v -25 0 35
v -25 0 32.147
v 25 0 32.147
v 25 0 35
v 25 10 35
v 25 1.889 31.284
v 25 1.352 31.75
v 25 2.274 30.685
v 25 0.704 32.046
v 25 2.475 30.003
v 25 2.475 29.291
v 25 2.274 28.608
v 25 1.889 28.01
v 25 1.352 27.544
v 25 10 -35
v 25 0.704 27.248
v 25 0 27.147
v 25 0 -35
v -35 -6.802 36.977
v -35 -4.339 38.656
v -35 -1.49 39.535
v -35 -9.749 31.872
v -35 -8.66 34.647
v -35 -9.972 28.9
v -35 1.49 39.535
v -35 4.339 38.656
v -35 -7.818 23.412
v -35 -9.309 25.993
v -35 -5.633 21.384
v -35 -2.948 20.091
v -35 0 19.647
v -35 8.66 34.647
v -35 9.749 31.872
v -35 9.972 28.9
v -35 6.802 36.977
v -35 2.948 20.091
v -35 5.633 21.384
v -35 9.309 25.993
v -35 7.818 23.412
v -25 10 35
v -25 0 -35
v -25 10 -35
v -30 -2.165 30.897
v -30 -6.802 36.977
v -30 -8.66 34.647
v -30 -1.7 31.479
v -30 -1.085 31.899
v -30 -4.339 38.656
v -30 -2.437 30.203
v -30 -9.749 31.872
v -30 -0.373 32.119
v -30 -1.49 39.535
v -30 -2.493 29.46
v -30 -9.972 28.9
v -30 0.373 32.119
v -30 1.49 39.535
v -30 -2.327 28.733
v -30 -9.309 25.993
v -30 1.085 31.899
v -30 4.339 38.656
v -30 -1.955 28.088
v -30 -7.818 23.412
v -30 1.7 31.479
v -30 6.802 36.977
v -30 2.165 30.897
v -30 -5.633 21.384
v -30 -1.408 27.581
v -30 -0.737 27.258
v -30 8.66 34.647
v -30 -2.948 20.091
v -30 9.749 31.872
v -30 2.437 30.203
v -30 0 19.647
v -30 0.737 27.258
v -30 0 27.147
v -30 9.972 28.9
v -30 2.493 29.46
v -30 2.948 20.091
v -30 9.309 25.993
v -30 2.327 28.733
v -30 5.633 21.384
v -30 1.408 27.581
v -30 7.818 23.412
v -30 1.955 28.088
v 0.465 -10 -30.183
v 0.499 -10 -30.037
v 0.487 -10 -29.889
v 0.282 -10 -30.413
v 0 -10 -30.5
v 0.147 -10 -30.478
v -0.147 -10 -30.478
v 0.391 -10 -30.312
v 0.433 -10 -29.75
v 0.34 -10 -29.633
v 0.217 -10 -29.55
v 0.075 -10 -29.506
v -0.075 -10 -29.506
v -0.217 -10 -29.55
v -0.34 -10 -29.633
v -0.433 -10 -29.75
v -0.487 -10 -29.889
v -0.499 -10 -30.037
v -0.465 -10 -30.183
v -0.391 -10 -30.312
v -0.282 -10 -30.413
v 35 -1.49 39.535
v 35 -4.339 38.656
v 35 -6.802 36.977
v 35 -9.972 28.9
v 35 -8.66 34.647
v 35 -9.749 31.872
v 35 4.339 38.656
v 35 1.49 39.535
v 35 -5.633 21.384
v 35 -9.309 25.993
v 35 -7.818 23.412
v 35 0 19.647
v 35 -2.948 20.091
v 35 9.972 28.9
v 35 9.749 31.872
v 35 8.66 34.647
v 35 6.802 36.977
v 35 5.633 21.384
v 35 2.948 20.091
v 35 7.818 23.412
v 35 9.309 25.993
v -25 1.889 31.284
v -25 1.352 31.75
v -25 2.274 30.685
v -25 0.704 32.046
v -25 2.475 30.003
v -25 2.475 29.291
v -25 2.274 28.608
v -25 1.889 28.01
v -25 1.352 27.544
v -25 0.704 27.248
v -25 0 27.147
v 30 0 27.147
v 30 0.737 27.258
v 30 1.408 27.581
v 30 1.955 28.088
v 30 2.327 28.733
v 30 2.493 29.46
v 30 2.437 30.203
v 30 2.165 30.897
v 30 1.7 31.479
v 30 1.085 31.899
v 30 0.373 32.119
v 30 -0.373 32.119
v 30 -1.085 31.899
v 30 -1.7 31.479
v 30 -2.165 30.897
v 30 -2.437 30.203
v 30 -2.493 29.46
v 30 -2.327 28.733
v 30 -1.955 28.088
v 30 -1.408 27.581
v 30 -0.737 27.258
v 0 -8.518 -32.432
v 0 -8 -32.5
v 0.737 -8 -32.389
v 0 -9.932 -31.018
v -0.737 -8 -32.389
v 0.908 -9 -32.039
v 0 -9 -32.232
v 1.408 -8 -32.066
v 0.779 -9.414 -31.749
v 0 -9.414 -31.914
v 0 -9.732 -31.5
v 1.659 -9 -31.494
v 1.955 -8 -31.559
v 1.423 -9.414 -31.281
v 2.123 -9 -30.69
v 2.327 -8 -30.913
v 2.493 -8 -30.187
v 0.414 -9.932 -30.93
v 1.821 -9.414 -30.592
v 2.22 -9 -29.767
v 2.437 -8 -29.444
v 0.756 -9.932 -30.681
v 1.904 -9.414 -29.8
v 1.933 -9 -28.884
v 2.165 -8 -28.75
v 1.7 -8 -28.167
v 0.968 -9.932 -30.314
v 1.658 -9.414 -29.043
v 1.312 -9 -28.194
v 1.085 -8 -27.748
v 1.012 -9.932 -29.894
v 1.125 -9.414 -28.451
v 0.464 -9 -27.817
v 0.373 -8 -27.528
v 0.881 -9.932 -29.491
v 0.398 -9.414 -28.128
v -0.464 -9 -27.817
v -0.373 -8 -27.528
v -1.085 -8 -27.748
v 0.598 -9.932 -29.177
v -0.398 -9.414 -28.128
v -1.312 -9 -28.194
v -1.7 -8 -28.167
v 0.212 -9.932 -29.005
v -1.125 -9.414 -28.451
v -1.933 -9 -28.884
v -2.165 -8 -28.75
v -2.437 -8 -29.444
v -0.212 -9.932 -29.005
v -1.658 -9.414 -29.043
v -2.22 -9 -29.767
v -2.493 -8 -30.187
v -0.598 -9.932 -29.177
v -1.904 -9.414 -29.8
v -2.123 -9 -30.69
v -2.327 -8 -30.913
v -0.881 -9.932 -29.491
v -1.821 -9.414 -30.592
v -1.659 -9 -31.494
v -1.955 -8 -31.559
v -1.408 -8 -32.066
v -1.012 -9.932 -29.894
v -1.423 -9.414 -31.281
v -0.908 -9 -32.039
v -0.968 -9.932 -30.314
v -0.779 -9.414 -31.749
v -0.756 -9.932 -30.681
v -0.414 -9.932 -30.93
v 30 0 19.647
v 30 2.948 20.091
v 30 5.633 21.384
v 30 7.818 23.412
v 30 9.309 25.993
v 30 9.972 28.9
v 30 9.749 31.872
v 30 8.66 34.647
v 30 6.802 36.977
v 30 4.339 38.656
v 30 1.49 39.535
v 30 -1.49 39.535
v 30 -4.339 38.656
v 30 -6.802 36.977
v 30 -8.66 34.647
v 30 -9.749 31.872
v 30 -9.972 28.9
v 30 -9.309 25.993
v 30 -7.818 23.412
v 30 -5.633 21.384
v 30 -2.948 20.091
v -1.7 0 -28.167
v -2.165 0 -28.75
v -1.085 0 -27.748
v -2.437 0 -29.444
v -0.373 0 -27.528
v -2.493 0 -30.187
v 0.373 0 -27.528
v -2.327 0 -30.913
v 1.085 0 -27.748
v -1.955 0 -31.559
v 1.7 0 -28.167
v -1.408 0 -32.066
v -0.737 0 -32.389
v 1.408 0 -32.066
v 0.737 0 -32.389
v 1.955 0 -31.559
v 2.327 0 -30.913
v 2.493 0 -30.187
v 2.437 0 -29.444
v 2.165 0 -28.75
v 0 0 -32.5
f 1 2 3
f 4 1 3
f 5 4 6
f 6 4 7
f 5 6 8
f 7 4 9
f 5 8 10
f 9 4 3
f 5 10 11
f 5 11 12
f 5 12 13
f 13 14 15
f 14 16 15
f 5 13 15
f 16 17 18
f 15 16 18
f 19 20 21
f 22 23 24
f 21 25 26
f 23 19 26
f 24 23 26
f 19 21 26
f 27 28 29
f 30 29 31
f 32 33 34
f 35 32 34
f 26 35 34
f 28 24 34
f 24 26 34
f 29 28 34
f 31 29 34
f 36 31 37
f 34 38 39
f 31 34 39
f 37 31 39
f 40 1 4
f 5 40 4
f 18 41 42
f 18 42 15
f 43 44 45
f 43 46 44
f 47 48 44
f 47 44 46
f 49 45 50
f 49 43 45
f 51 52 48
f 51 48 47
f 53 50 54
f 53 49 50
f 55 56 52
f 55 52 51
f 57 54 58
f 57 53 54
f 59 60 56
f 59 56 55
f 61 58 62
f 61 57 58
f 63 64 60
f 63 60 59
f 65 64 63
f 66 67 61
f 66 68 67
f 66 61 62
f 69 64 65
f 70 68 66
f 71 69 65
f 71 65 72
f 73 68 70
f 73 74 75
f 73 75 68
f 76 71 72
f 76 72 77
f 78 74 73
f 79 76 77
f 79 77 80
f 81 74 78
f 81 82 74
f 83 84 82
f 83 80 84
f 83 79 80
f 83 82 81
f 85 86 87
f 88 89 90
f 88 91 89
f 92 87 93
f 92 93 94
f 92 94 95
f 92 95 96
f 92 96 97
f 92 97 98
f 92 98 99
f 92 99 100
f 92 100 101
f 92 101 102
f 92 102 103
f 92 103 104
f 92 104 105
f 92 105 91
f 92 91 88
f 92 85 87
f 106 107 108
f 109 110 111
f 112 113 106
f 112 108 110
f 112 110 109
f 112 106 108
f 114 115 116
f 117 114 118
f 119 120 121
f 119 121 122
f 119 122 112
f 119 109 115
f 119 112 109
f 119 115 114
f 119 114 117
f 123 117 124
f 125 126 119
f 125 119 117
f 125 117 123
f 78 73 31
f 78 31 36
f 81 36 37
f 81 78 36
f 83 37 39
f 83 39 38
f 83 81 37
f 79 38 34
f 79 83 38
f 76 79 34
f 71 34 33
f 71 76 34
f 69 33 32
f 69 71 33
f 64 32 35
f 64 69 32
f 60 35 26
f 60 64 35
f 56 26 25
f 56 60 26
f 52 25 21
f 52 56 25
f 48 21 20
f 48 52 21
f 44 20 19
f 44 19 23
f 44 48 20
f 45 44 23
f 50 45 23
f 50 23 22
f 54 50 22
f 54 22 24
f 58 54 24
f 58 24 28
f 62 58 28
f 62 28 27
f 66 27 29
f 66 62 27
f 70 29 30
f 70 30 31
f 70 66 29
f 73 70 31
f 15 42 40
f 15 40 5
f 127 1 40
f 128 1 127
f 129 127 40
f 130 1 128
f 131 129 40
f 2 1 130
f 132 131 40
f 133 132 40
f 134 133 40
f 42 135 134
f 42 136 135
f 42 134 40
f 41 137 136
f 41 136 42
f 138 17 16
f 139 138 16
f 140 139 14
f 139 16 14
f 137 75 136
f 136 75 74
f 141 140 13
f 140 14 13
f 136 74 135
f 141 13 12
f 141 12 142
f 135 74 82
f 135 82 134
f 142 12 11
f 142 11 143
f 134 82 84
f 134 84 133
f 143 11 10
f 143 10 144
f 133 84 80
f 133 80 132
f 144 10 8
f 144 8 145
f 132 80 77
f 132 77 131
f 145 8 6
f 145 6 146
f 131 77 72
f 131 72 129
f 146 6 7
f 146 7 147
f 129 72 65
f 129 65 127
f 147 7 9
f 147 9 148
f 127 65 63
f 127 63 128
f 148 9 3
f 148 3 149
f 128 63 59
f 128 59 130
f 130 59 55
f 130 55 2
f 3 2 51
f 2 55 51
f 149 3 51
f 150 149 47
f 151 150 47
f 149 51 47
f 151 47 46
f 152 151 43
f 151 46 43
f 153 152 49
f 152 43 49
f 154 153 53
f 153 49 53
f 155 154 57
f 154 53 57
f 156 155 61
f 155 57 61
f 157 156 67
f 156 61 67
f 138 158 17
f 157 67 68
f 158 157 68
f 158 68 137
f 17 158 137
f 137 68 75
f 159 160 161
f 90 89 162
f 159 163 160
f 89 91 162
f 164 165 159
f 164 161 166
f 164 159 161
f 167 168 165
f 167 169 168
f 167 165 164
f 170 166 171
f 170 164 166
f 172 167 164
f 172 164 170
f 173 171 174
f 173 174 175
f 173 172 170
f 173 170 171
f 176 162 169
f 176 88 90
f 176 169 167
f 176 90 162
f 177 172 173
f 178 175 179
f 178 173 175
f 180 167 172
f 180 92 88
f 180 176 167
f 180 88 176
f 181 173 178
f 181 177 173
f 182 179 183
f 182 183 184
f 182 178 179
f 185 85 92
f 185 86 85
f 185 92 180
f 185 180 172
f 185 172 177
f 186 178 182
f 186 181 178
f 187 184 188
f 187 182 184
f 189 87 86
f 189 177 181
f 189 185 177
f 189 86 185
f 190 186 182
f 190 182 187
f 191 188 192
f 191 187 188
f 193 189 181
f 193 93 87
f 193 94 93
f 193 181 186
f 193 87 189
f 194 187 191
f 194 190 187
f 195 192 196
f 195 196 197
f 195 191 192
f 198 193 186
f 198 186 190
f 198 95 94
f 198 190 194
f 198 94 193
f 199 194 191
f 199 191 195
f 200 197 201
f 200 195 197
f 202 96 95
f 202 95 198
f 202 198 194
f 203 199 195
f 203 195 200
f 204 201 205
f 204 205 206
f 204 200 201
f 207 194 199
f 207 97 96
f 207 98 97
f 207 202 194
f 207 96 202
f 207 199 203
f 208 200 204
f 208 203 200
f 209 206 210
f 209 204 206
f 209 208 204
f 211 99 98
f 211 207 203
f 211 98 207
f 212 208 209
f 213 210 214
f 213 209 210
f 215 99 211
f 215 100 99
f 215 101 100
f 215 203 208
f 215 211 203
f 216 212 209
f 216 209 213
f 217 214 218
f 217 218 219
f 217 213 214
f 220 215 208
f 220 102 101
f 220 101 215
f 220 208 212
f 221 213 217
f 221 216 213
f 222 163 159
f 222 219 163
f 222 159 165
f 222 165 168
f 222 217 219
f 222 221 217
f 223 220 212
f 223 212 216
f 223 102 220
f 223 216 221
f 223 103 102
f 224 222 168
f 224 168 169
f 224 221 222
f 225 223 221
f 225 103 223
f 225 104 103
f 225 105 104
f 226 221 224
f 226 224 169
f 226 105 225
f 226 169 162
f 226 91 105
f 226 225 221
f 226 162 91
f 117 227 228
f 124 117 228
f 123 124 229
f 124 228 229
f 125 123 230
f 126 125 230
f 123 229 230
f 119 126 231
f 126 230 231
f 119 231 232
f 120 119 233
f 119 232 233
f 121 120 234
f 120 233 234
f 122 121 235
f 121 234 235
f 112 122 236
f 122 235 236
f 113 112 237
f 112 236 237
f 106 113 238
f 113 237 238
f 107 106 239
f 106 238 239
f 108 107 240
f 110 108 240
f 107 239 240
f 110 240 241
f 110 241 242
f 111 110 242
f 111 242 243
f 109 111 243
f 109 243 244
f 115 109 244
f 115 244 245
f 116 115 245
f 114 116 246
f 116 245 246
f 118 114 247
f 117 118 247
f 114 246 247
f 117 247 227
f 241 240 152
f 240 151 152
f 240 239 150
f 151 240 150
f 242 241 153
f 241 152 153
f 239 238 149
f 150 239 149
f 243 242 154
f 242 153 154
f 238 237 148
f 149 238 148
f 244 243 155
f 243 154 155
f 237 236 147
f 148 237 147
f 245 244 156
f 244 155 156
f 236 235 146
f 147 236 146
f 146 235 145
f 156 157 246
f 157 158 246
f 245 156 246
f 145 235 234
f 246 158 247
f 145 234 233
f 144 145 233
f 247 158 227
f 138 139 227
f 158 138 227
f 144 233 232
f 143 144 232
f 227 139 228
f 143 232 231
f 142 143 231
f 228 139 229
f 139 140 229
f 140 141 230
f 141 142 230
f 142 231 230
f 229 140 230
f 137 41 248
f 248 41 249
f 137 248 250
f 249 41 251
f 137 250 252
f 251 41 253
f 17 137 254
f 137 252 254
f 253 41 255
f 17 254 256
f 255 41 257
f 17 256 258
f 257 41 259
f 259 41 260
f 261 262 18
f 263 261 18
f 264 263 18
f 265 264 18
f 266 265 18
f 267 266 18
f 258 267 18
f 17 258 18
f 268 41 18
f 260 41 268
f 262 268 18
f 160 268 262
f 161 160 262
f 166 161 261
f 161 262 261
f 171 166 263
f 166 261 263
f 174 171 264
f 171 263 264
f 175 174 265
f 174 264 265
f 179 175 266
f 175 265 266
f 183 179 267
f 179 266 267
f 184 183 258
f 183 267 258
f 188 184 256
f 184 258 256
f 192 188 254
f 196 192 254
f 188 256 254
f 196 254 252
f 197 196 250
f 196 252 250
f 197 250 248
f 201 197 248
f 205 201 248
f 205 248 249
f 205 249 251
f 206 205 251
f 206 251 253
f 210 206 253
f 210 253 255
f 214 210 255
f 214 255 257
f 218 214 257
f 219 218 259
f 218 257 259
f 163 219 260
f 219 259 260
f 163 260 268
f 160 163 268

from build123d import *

# Parameters (mm, degrees)
CROQUIS2_W                   = 50
CROQUIS2_H                   = 70
SALIENTE_EXTRUIR1_DEPTH      = 10
SALIENTE_EXTRUIR2_DEPTH      = 30
SALIENTE_EXTRUIR2_DEPTH_BACK = 30
CROQUIS4_R                   = 2.5
CROQUIS5_R                   = 10
SALIENTE_EXTRUIR3_DEPTH      = 5
CROQUIS6_R                   = 2.5
SALIENTE_EXTRUIR4_DEPTH      = 10
REDONDEO1_R                  = 2


with BuildPart() as part:
    # Croquis2 → Saliente-Extruir1 (new body)
    with BuildSketch(Plane(origin=(0, 0, 0), x_dir=(1, 0, 0), z_dir=(0, 1, 0))):
        Rectangle(CROQUIS2_W, CROQUIS2_H)
    extrude(amount=SALIENTE_EXTRUIR1_DEPTH)

    # Croquis4 → Saliente-Extruir2 (add, two sides: drawn at the far end of the back side and taken through both)
    with BuildSketch(Plane(origin=(0, 0, 0), x_dir=(0, 0, -1), z_dir=(1, 0, 0)).offset(-SALIENTE_EXTRUIR2_DEPTH_BACK)):
        with Locations((-29.646809276, 0)):
            Circle(CROQUIS4_R)
    extrude(amount=SALIENTE_EXTRUIR2_DEPTH + SALIENTE_EXTRUIR2_DEPTH_BACK)

    # Croquis5 → Saliente-Extruir3 (add)
    with BuildSketch(Plane(origin=(30, 0, 0), x_dir=(0, 0, -1), z_dir=(1, 0, 0))):
        with Locations((-29.646809276, 0)):
            Circle(CROQUIS5_R)
    saliente_extruir3 = extrude(amount=SALIENTE_EXTRUIR3_DEPTH)

    # Simetría1: Saliente-Extruir3 across plane
    add(saliente_extruir3.mirror(Plane(origin=(0, 0, 0), x_dir=(0, 0, 1), z_dir=(1, 0, 0))))

    # Croquis6 → Saliente-Extruir4 (add)
    with BuildSketch(Plane.XZ):
        with Locations(Location((0, -30, 0), (0, 0, 270))):
            Circle(CROQUIS6_R)
    extrude(amount=SALIENTE_EXTRUIR4_DEPTH)

    # Redondeo1
    redondeo1_edges = [part.edges().sort_by_distance(p)[0] for p in [
        (0, -10, -27.5),
    ]]
    fillet(redondeo1_edges, radius=REDONDEO1_R)


solid = part.part
